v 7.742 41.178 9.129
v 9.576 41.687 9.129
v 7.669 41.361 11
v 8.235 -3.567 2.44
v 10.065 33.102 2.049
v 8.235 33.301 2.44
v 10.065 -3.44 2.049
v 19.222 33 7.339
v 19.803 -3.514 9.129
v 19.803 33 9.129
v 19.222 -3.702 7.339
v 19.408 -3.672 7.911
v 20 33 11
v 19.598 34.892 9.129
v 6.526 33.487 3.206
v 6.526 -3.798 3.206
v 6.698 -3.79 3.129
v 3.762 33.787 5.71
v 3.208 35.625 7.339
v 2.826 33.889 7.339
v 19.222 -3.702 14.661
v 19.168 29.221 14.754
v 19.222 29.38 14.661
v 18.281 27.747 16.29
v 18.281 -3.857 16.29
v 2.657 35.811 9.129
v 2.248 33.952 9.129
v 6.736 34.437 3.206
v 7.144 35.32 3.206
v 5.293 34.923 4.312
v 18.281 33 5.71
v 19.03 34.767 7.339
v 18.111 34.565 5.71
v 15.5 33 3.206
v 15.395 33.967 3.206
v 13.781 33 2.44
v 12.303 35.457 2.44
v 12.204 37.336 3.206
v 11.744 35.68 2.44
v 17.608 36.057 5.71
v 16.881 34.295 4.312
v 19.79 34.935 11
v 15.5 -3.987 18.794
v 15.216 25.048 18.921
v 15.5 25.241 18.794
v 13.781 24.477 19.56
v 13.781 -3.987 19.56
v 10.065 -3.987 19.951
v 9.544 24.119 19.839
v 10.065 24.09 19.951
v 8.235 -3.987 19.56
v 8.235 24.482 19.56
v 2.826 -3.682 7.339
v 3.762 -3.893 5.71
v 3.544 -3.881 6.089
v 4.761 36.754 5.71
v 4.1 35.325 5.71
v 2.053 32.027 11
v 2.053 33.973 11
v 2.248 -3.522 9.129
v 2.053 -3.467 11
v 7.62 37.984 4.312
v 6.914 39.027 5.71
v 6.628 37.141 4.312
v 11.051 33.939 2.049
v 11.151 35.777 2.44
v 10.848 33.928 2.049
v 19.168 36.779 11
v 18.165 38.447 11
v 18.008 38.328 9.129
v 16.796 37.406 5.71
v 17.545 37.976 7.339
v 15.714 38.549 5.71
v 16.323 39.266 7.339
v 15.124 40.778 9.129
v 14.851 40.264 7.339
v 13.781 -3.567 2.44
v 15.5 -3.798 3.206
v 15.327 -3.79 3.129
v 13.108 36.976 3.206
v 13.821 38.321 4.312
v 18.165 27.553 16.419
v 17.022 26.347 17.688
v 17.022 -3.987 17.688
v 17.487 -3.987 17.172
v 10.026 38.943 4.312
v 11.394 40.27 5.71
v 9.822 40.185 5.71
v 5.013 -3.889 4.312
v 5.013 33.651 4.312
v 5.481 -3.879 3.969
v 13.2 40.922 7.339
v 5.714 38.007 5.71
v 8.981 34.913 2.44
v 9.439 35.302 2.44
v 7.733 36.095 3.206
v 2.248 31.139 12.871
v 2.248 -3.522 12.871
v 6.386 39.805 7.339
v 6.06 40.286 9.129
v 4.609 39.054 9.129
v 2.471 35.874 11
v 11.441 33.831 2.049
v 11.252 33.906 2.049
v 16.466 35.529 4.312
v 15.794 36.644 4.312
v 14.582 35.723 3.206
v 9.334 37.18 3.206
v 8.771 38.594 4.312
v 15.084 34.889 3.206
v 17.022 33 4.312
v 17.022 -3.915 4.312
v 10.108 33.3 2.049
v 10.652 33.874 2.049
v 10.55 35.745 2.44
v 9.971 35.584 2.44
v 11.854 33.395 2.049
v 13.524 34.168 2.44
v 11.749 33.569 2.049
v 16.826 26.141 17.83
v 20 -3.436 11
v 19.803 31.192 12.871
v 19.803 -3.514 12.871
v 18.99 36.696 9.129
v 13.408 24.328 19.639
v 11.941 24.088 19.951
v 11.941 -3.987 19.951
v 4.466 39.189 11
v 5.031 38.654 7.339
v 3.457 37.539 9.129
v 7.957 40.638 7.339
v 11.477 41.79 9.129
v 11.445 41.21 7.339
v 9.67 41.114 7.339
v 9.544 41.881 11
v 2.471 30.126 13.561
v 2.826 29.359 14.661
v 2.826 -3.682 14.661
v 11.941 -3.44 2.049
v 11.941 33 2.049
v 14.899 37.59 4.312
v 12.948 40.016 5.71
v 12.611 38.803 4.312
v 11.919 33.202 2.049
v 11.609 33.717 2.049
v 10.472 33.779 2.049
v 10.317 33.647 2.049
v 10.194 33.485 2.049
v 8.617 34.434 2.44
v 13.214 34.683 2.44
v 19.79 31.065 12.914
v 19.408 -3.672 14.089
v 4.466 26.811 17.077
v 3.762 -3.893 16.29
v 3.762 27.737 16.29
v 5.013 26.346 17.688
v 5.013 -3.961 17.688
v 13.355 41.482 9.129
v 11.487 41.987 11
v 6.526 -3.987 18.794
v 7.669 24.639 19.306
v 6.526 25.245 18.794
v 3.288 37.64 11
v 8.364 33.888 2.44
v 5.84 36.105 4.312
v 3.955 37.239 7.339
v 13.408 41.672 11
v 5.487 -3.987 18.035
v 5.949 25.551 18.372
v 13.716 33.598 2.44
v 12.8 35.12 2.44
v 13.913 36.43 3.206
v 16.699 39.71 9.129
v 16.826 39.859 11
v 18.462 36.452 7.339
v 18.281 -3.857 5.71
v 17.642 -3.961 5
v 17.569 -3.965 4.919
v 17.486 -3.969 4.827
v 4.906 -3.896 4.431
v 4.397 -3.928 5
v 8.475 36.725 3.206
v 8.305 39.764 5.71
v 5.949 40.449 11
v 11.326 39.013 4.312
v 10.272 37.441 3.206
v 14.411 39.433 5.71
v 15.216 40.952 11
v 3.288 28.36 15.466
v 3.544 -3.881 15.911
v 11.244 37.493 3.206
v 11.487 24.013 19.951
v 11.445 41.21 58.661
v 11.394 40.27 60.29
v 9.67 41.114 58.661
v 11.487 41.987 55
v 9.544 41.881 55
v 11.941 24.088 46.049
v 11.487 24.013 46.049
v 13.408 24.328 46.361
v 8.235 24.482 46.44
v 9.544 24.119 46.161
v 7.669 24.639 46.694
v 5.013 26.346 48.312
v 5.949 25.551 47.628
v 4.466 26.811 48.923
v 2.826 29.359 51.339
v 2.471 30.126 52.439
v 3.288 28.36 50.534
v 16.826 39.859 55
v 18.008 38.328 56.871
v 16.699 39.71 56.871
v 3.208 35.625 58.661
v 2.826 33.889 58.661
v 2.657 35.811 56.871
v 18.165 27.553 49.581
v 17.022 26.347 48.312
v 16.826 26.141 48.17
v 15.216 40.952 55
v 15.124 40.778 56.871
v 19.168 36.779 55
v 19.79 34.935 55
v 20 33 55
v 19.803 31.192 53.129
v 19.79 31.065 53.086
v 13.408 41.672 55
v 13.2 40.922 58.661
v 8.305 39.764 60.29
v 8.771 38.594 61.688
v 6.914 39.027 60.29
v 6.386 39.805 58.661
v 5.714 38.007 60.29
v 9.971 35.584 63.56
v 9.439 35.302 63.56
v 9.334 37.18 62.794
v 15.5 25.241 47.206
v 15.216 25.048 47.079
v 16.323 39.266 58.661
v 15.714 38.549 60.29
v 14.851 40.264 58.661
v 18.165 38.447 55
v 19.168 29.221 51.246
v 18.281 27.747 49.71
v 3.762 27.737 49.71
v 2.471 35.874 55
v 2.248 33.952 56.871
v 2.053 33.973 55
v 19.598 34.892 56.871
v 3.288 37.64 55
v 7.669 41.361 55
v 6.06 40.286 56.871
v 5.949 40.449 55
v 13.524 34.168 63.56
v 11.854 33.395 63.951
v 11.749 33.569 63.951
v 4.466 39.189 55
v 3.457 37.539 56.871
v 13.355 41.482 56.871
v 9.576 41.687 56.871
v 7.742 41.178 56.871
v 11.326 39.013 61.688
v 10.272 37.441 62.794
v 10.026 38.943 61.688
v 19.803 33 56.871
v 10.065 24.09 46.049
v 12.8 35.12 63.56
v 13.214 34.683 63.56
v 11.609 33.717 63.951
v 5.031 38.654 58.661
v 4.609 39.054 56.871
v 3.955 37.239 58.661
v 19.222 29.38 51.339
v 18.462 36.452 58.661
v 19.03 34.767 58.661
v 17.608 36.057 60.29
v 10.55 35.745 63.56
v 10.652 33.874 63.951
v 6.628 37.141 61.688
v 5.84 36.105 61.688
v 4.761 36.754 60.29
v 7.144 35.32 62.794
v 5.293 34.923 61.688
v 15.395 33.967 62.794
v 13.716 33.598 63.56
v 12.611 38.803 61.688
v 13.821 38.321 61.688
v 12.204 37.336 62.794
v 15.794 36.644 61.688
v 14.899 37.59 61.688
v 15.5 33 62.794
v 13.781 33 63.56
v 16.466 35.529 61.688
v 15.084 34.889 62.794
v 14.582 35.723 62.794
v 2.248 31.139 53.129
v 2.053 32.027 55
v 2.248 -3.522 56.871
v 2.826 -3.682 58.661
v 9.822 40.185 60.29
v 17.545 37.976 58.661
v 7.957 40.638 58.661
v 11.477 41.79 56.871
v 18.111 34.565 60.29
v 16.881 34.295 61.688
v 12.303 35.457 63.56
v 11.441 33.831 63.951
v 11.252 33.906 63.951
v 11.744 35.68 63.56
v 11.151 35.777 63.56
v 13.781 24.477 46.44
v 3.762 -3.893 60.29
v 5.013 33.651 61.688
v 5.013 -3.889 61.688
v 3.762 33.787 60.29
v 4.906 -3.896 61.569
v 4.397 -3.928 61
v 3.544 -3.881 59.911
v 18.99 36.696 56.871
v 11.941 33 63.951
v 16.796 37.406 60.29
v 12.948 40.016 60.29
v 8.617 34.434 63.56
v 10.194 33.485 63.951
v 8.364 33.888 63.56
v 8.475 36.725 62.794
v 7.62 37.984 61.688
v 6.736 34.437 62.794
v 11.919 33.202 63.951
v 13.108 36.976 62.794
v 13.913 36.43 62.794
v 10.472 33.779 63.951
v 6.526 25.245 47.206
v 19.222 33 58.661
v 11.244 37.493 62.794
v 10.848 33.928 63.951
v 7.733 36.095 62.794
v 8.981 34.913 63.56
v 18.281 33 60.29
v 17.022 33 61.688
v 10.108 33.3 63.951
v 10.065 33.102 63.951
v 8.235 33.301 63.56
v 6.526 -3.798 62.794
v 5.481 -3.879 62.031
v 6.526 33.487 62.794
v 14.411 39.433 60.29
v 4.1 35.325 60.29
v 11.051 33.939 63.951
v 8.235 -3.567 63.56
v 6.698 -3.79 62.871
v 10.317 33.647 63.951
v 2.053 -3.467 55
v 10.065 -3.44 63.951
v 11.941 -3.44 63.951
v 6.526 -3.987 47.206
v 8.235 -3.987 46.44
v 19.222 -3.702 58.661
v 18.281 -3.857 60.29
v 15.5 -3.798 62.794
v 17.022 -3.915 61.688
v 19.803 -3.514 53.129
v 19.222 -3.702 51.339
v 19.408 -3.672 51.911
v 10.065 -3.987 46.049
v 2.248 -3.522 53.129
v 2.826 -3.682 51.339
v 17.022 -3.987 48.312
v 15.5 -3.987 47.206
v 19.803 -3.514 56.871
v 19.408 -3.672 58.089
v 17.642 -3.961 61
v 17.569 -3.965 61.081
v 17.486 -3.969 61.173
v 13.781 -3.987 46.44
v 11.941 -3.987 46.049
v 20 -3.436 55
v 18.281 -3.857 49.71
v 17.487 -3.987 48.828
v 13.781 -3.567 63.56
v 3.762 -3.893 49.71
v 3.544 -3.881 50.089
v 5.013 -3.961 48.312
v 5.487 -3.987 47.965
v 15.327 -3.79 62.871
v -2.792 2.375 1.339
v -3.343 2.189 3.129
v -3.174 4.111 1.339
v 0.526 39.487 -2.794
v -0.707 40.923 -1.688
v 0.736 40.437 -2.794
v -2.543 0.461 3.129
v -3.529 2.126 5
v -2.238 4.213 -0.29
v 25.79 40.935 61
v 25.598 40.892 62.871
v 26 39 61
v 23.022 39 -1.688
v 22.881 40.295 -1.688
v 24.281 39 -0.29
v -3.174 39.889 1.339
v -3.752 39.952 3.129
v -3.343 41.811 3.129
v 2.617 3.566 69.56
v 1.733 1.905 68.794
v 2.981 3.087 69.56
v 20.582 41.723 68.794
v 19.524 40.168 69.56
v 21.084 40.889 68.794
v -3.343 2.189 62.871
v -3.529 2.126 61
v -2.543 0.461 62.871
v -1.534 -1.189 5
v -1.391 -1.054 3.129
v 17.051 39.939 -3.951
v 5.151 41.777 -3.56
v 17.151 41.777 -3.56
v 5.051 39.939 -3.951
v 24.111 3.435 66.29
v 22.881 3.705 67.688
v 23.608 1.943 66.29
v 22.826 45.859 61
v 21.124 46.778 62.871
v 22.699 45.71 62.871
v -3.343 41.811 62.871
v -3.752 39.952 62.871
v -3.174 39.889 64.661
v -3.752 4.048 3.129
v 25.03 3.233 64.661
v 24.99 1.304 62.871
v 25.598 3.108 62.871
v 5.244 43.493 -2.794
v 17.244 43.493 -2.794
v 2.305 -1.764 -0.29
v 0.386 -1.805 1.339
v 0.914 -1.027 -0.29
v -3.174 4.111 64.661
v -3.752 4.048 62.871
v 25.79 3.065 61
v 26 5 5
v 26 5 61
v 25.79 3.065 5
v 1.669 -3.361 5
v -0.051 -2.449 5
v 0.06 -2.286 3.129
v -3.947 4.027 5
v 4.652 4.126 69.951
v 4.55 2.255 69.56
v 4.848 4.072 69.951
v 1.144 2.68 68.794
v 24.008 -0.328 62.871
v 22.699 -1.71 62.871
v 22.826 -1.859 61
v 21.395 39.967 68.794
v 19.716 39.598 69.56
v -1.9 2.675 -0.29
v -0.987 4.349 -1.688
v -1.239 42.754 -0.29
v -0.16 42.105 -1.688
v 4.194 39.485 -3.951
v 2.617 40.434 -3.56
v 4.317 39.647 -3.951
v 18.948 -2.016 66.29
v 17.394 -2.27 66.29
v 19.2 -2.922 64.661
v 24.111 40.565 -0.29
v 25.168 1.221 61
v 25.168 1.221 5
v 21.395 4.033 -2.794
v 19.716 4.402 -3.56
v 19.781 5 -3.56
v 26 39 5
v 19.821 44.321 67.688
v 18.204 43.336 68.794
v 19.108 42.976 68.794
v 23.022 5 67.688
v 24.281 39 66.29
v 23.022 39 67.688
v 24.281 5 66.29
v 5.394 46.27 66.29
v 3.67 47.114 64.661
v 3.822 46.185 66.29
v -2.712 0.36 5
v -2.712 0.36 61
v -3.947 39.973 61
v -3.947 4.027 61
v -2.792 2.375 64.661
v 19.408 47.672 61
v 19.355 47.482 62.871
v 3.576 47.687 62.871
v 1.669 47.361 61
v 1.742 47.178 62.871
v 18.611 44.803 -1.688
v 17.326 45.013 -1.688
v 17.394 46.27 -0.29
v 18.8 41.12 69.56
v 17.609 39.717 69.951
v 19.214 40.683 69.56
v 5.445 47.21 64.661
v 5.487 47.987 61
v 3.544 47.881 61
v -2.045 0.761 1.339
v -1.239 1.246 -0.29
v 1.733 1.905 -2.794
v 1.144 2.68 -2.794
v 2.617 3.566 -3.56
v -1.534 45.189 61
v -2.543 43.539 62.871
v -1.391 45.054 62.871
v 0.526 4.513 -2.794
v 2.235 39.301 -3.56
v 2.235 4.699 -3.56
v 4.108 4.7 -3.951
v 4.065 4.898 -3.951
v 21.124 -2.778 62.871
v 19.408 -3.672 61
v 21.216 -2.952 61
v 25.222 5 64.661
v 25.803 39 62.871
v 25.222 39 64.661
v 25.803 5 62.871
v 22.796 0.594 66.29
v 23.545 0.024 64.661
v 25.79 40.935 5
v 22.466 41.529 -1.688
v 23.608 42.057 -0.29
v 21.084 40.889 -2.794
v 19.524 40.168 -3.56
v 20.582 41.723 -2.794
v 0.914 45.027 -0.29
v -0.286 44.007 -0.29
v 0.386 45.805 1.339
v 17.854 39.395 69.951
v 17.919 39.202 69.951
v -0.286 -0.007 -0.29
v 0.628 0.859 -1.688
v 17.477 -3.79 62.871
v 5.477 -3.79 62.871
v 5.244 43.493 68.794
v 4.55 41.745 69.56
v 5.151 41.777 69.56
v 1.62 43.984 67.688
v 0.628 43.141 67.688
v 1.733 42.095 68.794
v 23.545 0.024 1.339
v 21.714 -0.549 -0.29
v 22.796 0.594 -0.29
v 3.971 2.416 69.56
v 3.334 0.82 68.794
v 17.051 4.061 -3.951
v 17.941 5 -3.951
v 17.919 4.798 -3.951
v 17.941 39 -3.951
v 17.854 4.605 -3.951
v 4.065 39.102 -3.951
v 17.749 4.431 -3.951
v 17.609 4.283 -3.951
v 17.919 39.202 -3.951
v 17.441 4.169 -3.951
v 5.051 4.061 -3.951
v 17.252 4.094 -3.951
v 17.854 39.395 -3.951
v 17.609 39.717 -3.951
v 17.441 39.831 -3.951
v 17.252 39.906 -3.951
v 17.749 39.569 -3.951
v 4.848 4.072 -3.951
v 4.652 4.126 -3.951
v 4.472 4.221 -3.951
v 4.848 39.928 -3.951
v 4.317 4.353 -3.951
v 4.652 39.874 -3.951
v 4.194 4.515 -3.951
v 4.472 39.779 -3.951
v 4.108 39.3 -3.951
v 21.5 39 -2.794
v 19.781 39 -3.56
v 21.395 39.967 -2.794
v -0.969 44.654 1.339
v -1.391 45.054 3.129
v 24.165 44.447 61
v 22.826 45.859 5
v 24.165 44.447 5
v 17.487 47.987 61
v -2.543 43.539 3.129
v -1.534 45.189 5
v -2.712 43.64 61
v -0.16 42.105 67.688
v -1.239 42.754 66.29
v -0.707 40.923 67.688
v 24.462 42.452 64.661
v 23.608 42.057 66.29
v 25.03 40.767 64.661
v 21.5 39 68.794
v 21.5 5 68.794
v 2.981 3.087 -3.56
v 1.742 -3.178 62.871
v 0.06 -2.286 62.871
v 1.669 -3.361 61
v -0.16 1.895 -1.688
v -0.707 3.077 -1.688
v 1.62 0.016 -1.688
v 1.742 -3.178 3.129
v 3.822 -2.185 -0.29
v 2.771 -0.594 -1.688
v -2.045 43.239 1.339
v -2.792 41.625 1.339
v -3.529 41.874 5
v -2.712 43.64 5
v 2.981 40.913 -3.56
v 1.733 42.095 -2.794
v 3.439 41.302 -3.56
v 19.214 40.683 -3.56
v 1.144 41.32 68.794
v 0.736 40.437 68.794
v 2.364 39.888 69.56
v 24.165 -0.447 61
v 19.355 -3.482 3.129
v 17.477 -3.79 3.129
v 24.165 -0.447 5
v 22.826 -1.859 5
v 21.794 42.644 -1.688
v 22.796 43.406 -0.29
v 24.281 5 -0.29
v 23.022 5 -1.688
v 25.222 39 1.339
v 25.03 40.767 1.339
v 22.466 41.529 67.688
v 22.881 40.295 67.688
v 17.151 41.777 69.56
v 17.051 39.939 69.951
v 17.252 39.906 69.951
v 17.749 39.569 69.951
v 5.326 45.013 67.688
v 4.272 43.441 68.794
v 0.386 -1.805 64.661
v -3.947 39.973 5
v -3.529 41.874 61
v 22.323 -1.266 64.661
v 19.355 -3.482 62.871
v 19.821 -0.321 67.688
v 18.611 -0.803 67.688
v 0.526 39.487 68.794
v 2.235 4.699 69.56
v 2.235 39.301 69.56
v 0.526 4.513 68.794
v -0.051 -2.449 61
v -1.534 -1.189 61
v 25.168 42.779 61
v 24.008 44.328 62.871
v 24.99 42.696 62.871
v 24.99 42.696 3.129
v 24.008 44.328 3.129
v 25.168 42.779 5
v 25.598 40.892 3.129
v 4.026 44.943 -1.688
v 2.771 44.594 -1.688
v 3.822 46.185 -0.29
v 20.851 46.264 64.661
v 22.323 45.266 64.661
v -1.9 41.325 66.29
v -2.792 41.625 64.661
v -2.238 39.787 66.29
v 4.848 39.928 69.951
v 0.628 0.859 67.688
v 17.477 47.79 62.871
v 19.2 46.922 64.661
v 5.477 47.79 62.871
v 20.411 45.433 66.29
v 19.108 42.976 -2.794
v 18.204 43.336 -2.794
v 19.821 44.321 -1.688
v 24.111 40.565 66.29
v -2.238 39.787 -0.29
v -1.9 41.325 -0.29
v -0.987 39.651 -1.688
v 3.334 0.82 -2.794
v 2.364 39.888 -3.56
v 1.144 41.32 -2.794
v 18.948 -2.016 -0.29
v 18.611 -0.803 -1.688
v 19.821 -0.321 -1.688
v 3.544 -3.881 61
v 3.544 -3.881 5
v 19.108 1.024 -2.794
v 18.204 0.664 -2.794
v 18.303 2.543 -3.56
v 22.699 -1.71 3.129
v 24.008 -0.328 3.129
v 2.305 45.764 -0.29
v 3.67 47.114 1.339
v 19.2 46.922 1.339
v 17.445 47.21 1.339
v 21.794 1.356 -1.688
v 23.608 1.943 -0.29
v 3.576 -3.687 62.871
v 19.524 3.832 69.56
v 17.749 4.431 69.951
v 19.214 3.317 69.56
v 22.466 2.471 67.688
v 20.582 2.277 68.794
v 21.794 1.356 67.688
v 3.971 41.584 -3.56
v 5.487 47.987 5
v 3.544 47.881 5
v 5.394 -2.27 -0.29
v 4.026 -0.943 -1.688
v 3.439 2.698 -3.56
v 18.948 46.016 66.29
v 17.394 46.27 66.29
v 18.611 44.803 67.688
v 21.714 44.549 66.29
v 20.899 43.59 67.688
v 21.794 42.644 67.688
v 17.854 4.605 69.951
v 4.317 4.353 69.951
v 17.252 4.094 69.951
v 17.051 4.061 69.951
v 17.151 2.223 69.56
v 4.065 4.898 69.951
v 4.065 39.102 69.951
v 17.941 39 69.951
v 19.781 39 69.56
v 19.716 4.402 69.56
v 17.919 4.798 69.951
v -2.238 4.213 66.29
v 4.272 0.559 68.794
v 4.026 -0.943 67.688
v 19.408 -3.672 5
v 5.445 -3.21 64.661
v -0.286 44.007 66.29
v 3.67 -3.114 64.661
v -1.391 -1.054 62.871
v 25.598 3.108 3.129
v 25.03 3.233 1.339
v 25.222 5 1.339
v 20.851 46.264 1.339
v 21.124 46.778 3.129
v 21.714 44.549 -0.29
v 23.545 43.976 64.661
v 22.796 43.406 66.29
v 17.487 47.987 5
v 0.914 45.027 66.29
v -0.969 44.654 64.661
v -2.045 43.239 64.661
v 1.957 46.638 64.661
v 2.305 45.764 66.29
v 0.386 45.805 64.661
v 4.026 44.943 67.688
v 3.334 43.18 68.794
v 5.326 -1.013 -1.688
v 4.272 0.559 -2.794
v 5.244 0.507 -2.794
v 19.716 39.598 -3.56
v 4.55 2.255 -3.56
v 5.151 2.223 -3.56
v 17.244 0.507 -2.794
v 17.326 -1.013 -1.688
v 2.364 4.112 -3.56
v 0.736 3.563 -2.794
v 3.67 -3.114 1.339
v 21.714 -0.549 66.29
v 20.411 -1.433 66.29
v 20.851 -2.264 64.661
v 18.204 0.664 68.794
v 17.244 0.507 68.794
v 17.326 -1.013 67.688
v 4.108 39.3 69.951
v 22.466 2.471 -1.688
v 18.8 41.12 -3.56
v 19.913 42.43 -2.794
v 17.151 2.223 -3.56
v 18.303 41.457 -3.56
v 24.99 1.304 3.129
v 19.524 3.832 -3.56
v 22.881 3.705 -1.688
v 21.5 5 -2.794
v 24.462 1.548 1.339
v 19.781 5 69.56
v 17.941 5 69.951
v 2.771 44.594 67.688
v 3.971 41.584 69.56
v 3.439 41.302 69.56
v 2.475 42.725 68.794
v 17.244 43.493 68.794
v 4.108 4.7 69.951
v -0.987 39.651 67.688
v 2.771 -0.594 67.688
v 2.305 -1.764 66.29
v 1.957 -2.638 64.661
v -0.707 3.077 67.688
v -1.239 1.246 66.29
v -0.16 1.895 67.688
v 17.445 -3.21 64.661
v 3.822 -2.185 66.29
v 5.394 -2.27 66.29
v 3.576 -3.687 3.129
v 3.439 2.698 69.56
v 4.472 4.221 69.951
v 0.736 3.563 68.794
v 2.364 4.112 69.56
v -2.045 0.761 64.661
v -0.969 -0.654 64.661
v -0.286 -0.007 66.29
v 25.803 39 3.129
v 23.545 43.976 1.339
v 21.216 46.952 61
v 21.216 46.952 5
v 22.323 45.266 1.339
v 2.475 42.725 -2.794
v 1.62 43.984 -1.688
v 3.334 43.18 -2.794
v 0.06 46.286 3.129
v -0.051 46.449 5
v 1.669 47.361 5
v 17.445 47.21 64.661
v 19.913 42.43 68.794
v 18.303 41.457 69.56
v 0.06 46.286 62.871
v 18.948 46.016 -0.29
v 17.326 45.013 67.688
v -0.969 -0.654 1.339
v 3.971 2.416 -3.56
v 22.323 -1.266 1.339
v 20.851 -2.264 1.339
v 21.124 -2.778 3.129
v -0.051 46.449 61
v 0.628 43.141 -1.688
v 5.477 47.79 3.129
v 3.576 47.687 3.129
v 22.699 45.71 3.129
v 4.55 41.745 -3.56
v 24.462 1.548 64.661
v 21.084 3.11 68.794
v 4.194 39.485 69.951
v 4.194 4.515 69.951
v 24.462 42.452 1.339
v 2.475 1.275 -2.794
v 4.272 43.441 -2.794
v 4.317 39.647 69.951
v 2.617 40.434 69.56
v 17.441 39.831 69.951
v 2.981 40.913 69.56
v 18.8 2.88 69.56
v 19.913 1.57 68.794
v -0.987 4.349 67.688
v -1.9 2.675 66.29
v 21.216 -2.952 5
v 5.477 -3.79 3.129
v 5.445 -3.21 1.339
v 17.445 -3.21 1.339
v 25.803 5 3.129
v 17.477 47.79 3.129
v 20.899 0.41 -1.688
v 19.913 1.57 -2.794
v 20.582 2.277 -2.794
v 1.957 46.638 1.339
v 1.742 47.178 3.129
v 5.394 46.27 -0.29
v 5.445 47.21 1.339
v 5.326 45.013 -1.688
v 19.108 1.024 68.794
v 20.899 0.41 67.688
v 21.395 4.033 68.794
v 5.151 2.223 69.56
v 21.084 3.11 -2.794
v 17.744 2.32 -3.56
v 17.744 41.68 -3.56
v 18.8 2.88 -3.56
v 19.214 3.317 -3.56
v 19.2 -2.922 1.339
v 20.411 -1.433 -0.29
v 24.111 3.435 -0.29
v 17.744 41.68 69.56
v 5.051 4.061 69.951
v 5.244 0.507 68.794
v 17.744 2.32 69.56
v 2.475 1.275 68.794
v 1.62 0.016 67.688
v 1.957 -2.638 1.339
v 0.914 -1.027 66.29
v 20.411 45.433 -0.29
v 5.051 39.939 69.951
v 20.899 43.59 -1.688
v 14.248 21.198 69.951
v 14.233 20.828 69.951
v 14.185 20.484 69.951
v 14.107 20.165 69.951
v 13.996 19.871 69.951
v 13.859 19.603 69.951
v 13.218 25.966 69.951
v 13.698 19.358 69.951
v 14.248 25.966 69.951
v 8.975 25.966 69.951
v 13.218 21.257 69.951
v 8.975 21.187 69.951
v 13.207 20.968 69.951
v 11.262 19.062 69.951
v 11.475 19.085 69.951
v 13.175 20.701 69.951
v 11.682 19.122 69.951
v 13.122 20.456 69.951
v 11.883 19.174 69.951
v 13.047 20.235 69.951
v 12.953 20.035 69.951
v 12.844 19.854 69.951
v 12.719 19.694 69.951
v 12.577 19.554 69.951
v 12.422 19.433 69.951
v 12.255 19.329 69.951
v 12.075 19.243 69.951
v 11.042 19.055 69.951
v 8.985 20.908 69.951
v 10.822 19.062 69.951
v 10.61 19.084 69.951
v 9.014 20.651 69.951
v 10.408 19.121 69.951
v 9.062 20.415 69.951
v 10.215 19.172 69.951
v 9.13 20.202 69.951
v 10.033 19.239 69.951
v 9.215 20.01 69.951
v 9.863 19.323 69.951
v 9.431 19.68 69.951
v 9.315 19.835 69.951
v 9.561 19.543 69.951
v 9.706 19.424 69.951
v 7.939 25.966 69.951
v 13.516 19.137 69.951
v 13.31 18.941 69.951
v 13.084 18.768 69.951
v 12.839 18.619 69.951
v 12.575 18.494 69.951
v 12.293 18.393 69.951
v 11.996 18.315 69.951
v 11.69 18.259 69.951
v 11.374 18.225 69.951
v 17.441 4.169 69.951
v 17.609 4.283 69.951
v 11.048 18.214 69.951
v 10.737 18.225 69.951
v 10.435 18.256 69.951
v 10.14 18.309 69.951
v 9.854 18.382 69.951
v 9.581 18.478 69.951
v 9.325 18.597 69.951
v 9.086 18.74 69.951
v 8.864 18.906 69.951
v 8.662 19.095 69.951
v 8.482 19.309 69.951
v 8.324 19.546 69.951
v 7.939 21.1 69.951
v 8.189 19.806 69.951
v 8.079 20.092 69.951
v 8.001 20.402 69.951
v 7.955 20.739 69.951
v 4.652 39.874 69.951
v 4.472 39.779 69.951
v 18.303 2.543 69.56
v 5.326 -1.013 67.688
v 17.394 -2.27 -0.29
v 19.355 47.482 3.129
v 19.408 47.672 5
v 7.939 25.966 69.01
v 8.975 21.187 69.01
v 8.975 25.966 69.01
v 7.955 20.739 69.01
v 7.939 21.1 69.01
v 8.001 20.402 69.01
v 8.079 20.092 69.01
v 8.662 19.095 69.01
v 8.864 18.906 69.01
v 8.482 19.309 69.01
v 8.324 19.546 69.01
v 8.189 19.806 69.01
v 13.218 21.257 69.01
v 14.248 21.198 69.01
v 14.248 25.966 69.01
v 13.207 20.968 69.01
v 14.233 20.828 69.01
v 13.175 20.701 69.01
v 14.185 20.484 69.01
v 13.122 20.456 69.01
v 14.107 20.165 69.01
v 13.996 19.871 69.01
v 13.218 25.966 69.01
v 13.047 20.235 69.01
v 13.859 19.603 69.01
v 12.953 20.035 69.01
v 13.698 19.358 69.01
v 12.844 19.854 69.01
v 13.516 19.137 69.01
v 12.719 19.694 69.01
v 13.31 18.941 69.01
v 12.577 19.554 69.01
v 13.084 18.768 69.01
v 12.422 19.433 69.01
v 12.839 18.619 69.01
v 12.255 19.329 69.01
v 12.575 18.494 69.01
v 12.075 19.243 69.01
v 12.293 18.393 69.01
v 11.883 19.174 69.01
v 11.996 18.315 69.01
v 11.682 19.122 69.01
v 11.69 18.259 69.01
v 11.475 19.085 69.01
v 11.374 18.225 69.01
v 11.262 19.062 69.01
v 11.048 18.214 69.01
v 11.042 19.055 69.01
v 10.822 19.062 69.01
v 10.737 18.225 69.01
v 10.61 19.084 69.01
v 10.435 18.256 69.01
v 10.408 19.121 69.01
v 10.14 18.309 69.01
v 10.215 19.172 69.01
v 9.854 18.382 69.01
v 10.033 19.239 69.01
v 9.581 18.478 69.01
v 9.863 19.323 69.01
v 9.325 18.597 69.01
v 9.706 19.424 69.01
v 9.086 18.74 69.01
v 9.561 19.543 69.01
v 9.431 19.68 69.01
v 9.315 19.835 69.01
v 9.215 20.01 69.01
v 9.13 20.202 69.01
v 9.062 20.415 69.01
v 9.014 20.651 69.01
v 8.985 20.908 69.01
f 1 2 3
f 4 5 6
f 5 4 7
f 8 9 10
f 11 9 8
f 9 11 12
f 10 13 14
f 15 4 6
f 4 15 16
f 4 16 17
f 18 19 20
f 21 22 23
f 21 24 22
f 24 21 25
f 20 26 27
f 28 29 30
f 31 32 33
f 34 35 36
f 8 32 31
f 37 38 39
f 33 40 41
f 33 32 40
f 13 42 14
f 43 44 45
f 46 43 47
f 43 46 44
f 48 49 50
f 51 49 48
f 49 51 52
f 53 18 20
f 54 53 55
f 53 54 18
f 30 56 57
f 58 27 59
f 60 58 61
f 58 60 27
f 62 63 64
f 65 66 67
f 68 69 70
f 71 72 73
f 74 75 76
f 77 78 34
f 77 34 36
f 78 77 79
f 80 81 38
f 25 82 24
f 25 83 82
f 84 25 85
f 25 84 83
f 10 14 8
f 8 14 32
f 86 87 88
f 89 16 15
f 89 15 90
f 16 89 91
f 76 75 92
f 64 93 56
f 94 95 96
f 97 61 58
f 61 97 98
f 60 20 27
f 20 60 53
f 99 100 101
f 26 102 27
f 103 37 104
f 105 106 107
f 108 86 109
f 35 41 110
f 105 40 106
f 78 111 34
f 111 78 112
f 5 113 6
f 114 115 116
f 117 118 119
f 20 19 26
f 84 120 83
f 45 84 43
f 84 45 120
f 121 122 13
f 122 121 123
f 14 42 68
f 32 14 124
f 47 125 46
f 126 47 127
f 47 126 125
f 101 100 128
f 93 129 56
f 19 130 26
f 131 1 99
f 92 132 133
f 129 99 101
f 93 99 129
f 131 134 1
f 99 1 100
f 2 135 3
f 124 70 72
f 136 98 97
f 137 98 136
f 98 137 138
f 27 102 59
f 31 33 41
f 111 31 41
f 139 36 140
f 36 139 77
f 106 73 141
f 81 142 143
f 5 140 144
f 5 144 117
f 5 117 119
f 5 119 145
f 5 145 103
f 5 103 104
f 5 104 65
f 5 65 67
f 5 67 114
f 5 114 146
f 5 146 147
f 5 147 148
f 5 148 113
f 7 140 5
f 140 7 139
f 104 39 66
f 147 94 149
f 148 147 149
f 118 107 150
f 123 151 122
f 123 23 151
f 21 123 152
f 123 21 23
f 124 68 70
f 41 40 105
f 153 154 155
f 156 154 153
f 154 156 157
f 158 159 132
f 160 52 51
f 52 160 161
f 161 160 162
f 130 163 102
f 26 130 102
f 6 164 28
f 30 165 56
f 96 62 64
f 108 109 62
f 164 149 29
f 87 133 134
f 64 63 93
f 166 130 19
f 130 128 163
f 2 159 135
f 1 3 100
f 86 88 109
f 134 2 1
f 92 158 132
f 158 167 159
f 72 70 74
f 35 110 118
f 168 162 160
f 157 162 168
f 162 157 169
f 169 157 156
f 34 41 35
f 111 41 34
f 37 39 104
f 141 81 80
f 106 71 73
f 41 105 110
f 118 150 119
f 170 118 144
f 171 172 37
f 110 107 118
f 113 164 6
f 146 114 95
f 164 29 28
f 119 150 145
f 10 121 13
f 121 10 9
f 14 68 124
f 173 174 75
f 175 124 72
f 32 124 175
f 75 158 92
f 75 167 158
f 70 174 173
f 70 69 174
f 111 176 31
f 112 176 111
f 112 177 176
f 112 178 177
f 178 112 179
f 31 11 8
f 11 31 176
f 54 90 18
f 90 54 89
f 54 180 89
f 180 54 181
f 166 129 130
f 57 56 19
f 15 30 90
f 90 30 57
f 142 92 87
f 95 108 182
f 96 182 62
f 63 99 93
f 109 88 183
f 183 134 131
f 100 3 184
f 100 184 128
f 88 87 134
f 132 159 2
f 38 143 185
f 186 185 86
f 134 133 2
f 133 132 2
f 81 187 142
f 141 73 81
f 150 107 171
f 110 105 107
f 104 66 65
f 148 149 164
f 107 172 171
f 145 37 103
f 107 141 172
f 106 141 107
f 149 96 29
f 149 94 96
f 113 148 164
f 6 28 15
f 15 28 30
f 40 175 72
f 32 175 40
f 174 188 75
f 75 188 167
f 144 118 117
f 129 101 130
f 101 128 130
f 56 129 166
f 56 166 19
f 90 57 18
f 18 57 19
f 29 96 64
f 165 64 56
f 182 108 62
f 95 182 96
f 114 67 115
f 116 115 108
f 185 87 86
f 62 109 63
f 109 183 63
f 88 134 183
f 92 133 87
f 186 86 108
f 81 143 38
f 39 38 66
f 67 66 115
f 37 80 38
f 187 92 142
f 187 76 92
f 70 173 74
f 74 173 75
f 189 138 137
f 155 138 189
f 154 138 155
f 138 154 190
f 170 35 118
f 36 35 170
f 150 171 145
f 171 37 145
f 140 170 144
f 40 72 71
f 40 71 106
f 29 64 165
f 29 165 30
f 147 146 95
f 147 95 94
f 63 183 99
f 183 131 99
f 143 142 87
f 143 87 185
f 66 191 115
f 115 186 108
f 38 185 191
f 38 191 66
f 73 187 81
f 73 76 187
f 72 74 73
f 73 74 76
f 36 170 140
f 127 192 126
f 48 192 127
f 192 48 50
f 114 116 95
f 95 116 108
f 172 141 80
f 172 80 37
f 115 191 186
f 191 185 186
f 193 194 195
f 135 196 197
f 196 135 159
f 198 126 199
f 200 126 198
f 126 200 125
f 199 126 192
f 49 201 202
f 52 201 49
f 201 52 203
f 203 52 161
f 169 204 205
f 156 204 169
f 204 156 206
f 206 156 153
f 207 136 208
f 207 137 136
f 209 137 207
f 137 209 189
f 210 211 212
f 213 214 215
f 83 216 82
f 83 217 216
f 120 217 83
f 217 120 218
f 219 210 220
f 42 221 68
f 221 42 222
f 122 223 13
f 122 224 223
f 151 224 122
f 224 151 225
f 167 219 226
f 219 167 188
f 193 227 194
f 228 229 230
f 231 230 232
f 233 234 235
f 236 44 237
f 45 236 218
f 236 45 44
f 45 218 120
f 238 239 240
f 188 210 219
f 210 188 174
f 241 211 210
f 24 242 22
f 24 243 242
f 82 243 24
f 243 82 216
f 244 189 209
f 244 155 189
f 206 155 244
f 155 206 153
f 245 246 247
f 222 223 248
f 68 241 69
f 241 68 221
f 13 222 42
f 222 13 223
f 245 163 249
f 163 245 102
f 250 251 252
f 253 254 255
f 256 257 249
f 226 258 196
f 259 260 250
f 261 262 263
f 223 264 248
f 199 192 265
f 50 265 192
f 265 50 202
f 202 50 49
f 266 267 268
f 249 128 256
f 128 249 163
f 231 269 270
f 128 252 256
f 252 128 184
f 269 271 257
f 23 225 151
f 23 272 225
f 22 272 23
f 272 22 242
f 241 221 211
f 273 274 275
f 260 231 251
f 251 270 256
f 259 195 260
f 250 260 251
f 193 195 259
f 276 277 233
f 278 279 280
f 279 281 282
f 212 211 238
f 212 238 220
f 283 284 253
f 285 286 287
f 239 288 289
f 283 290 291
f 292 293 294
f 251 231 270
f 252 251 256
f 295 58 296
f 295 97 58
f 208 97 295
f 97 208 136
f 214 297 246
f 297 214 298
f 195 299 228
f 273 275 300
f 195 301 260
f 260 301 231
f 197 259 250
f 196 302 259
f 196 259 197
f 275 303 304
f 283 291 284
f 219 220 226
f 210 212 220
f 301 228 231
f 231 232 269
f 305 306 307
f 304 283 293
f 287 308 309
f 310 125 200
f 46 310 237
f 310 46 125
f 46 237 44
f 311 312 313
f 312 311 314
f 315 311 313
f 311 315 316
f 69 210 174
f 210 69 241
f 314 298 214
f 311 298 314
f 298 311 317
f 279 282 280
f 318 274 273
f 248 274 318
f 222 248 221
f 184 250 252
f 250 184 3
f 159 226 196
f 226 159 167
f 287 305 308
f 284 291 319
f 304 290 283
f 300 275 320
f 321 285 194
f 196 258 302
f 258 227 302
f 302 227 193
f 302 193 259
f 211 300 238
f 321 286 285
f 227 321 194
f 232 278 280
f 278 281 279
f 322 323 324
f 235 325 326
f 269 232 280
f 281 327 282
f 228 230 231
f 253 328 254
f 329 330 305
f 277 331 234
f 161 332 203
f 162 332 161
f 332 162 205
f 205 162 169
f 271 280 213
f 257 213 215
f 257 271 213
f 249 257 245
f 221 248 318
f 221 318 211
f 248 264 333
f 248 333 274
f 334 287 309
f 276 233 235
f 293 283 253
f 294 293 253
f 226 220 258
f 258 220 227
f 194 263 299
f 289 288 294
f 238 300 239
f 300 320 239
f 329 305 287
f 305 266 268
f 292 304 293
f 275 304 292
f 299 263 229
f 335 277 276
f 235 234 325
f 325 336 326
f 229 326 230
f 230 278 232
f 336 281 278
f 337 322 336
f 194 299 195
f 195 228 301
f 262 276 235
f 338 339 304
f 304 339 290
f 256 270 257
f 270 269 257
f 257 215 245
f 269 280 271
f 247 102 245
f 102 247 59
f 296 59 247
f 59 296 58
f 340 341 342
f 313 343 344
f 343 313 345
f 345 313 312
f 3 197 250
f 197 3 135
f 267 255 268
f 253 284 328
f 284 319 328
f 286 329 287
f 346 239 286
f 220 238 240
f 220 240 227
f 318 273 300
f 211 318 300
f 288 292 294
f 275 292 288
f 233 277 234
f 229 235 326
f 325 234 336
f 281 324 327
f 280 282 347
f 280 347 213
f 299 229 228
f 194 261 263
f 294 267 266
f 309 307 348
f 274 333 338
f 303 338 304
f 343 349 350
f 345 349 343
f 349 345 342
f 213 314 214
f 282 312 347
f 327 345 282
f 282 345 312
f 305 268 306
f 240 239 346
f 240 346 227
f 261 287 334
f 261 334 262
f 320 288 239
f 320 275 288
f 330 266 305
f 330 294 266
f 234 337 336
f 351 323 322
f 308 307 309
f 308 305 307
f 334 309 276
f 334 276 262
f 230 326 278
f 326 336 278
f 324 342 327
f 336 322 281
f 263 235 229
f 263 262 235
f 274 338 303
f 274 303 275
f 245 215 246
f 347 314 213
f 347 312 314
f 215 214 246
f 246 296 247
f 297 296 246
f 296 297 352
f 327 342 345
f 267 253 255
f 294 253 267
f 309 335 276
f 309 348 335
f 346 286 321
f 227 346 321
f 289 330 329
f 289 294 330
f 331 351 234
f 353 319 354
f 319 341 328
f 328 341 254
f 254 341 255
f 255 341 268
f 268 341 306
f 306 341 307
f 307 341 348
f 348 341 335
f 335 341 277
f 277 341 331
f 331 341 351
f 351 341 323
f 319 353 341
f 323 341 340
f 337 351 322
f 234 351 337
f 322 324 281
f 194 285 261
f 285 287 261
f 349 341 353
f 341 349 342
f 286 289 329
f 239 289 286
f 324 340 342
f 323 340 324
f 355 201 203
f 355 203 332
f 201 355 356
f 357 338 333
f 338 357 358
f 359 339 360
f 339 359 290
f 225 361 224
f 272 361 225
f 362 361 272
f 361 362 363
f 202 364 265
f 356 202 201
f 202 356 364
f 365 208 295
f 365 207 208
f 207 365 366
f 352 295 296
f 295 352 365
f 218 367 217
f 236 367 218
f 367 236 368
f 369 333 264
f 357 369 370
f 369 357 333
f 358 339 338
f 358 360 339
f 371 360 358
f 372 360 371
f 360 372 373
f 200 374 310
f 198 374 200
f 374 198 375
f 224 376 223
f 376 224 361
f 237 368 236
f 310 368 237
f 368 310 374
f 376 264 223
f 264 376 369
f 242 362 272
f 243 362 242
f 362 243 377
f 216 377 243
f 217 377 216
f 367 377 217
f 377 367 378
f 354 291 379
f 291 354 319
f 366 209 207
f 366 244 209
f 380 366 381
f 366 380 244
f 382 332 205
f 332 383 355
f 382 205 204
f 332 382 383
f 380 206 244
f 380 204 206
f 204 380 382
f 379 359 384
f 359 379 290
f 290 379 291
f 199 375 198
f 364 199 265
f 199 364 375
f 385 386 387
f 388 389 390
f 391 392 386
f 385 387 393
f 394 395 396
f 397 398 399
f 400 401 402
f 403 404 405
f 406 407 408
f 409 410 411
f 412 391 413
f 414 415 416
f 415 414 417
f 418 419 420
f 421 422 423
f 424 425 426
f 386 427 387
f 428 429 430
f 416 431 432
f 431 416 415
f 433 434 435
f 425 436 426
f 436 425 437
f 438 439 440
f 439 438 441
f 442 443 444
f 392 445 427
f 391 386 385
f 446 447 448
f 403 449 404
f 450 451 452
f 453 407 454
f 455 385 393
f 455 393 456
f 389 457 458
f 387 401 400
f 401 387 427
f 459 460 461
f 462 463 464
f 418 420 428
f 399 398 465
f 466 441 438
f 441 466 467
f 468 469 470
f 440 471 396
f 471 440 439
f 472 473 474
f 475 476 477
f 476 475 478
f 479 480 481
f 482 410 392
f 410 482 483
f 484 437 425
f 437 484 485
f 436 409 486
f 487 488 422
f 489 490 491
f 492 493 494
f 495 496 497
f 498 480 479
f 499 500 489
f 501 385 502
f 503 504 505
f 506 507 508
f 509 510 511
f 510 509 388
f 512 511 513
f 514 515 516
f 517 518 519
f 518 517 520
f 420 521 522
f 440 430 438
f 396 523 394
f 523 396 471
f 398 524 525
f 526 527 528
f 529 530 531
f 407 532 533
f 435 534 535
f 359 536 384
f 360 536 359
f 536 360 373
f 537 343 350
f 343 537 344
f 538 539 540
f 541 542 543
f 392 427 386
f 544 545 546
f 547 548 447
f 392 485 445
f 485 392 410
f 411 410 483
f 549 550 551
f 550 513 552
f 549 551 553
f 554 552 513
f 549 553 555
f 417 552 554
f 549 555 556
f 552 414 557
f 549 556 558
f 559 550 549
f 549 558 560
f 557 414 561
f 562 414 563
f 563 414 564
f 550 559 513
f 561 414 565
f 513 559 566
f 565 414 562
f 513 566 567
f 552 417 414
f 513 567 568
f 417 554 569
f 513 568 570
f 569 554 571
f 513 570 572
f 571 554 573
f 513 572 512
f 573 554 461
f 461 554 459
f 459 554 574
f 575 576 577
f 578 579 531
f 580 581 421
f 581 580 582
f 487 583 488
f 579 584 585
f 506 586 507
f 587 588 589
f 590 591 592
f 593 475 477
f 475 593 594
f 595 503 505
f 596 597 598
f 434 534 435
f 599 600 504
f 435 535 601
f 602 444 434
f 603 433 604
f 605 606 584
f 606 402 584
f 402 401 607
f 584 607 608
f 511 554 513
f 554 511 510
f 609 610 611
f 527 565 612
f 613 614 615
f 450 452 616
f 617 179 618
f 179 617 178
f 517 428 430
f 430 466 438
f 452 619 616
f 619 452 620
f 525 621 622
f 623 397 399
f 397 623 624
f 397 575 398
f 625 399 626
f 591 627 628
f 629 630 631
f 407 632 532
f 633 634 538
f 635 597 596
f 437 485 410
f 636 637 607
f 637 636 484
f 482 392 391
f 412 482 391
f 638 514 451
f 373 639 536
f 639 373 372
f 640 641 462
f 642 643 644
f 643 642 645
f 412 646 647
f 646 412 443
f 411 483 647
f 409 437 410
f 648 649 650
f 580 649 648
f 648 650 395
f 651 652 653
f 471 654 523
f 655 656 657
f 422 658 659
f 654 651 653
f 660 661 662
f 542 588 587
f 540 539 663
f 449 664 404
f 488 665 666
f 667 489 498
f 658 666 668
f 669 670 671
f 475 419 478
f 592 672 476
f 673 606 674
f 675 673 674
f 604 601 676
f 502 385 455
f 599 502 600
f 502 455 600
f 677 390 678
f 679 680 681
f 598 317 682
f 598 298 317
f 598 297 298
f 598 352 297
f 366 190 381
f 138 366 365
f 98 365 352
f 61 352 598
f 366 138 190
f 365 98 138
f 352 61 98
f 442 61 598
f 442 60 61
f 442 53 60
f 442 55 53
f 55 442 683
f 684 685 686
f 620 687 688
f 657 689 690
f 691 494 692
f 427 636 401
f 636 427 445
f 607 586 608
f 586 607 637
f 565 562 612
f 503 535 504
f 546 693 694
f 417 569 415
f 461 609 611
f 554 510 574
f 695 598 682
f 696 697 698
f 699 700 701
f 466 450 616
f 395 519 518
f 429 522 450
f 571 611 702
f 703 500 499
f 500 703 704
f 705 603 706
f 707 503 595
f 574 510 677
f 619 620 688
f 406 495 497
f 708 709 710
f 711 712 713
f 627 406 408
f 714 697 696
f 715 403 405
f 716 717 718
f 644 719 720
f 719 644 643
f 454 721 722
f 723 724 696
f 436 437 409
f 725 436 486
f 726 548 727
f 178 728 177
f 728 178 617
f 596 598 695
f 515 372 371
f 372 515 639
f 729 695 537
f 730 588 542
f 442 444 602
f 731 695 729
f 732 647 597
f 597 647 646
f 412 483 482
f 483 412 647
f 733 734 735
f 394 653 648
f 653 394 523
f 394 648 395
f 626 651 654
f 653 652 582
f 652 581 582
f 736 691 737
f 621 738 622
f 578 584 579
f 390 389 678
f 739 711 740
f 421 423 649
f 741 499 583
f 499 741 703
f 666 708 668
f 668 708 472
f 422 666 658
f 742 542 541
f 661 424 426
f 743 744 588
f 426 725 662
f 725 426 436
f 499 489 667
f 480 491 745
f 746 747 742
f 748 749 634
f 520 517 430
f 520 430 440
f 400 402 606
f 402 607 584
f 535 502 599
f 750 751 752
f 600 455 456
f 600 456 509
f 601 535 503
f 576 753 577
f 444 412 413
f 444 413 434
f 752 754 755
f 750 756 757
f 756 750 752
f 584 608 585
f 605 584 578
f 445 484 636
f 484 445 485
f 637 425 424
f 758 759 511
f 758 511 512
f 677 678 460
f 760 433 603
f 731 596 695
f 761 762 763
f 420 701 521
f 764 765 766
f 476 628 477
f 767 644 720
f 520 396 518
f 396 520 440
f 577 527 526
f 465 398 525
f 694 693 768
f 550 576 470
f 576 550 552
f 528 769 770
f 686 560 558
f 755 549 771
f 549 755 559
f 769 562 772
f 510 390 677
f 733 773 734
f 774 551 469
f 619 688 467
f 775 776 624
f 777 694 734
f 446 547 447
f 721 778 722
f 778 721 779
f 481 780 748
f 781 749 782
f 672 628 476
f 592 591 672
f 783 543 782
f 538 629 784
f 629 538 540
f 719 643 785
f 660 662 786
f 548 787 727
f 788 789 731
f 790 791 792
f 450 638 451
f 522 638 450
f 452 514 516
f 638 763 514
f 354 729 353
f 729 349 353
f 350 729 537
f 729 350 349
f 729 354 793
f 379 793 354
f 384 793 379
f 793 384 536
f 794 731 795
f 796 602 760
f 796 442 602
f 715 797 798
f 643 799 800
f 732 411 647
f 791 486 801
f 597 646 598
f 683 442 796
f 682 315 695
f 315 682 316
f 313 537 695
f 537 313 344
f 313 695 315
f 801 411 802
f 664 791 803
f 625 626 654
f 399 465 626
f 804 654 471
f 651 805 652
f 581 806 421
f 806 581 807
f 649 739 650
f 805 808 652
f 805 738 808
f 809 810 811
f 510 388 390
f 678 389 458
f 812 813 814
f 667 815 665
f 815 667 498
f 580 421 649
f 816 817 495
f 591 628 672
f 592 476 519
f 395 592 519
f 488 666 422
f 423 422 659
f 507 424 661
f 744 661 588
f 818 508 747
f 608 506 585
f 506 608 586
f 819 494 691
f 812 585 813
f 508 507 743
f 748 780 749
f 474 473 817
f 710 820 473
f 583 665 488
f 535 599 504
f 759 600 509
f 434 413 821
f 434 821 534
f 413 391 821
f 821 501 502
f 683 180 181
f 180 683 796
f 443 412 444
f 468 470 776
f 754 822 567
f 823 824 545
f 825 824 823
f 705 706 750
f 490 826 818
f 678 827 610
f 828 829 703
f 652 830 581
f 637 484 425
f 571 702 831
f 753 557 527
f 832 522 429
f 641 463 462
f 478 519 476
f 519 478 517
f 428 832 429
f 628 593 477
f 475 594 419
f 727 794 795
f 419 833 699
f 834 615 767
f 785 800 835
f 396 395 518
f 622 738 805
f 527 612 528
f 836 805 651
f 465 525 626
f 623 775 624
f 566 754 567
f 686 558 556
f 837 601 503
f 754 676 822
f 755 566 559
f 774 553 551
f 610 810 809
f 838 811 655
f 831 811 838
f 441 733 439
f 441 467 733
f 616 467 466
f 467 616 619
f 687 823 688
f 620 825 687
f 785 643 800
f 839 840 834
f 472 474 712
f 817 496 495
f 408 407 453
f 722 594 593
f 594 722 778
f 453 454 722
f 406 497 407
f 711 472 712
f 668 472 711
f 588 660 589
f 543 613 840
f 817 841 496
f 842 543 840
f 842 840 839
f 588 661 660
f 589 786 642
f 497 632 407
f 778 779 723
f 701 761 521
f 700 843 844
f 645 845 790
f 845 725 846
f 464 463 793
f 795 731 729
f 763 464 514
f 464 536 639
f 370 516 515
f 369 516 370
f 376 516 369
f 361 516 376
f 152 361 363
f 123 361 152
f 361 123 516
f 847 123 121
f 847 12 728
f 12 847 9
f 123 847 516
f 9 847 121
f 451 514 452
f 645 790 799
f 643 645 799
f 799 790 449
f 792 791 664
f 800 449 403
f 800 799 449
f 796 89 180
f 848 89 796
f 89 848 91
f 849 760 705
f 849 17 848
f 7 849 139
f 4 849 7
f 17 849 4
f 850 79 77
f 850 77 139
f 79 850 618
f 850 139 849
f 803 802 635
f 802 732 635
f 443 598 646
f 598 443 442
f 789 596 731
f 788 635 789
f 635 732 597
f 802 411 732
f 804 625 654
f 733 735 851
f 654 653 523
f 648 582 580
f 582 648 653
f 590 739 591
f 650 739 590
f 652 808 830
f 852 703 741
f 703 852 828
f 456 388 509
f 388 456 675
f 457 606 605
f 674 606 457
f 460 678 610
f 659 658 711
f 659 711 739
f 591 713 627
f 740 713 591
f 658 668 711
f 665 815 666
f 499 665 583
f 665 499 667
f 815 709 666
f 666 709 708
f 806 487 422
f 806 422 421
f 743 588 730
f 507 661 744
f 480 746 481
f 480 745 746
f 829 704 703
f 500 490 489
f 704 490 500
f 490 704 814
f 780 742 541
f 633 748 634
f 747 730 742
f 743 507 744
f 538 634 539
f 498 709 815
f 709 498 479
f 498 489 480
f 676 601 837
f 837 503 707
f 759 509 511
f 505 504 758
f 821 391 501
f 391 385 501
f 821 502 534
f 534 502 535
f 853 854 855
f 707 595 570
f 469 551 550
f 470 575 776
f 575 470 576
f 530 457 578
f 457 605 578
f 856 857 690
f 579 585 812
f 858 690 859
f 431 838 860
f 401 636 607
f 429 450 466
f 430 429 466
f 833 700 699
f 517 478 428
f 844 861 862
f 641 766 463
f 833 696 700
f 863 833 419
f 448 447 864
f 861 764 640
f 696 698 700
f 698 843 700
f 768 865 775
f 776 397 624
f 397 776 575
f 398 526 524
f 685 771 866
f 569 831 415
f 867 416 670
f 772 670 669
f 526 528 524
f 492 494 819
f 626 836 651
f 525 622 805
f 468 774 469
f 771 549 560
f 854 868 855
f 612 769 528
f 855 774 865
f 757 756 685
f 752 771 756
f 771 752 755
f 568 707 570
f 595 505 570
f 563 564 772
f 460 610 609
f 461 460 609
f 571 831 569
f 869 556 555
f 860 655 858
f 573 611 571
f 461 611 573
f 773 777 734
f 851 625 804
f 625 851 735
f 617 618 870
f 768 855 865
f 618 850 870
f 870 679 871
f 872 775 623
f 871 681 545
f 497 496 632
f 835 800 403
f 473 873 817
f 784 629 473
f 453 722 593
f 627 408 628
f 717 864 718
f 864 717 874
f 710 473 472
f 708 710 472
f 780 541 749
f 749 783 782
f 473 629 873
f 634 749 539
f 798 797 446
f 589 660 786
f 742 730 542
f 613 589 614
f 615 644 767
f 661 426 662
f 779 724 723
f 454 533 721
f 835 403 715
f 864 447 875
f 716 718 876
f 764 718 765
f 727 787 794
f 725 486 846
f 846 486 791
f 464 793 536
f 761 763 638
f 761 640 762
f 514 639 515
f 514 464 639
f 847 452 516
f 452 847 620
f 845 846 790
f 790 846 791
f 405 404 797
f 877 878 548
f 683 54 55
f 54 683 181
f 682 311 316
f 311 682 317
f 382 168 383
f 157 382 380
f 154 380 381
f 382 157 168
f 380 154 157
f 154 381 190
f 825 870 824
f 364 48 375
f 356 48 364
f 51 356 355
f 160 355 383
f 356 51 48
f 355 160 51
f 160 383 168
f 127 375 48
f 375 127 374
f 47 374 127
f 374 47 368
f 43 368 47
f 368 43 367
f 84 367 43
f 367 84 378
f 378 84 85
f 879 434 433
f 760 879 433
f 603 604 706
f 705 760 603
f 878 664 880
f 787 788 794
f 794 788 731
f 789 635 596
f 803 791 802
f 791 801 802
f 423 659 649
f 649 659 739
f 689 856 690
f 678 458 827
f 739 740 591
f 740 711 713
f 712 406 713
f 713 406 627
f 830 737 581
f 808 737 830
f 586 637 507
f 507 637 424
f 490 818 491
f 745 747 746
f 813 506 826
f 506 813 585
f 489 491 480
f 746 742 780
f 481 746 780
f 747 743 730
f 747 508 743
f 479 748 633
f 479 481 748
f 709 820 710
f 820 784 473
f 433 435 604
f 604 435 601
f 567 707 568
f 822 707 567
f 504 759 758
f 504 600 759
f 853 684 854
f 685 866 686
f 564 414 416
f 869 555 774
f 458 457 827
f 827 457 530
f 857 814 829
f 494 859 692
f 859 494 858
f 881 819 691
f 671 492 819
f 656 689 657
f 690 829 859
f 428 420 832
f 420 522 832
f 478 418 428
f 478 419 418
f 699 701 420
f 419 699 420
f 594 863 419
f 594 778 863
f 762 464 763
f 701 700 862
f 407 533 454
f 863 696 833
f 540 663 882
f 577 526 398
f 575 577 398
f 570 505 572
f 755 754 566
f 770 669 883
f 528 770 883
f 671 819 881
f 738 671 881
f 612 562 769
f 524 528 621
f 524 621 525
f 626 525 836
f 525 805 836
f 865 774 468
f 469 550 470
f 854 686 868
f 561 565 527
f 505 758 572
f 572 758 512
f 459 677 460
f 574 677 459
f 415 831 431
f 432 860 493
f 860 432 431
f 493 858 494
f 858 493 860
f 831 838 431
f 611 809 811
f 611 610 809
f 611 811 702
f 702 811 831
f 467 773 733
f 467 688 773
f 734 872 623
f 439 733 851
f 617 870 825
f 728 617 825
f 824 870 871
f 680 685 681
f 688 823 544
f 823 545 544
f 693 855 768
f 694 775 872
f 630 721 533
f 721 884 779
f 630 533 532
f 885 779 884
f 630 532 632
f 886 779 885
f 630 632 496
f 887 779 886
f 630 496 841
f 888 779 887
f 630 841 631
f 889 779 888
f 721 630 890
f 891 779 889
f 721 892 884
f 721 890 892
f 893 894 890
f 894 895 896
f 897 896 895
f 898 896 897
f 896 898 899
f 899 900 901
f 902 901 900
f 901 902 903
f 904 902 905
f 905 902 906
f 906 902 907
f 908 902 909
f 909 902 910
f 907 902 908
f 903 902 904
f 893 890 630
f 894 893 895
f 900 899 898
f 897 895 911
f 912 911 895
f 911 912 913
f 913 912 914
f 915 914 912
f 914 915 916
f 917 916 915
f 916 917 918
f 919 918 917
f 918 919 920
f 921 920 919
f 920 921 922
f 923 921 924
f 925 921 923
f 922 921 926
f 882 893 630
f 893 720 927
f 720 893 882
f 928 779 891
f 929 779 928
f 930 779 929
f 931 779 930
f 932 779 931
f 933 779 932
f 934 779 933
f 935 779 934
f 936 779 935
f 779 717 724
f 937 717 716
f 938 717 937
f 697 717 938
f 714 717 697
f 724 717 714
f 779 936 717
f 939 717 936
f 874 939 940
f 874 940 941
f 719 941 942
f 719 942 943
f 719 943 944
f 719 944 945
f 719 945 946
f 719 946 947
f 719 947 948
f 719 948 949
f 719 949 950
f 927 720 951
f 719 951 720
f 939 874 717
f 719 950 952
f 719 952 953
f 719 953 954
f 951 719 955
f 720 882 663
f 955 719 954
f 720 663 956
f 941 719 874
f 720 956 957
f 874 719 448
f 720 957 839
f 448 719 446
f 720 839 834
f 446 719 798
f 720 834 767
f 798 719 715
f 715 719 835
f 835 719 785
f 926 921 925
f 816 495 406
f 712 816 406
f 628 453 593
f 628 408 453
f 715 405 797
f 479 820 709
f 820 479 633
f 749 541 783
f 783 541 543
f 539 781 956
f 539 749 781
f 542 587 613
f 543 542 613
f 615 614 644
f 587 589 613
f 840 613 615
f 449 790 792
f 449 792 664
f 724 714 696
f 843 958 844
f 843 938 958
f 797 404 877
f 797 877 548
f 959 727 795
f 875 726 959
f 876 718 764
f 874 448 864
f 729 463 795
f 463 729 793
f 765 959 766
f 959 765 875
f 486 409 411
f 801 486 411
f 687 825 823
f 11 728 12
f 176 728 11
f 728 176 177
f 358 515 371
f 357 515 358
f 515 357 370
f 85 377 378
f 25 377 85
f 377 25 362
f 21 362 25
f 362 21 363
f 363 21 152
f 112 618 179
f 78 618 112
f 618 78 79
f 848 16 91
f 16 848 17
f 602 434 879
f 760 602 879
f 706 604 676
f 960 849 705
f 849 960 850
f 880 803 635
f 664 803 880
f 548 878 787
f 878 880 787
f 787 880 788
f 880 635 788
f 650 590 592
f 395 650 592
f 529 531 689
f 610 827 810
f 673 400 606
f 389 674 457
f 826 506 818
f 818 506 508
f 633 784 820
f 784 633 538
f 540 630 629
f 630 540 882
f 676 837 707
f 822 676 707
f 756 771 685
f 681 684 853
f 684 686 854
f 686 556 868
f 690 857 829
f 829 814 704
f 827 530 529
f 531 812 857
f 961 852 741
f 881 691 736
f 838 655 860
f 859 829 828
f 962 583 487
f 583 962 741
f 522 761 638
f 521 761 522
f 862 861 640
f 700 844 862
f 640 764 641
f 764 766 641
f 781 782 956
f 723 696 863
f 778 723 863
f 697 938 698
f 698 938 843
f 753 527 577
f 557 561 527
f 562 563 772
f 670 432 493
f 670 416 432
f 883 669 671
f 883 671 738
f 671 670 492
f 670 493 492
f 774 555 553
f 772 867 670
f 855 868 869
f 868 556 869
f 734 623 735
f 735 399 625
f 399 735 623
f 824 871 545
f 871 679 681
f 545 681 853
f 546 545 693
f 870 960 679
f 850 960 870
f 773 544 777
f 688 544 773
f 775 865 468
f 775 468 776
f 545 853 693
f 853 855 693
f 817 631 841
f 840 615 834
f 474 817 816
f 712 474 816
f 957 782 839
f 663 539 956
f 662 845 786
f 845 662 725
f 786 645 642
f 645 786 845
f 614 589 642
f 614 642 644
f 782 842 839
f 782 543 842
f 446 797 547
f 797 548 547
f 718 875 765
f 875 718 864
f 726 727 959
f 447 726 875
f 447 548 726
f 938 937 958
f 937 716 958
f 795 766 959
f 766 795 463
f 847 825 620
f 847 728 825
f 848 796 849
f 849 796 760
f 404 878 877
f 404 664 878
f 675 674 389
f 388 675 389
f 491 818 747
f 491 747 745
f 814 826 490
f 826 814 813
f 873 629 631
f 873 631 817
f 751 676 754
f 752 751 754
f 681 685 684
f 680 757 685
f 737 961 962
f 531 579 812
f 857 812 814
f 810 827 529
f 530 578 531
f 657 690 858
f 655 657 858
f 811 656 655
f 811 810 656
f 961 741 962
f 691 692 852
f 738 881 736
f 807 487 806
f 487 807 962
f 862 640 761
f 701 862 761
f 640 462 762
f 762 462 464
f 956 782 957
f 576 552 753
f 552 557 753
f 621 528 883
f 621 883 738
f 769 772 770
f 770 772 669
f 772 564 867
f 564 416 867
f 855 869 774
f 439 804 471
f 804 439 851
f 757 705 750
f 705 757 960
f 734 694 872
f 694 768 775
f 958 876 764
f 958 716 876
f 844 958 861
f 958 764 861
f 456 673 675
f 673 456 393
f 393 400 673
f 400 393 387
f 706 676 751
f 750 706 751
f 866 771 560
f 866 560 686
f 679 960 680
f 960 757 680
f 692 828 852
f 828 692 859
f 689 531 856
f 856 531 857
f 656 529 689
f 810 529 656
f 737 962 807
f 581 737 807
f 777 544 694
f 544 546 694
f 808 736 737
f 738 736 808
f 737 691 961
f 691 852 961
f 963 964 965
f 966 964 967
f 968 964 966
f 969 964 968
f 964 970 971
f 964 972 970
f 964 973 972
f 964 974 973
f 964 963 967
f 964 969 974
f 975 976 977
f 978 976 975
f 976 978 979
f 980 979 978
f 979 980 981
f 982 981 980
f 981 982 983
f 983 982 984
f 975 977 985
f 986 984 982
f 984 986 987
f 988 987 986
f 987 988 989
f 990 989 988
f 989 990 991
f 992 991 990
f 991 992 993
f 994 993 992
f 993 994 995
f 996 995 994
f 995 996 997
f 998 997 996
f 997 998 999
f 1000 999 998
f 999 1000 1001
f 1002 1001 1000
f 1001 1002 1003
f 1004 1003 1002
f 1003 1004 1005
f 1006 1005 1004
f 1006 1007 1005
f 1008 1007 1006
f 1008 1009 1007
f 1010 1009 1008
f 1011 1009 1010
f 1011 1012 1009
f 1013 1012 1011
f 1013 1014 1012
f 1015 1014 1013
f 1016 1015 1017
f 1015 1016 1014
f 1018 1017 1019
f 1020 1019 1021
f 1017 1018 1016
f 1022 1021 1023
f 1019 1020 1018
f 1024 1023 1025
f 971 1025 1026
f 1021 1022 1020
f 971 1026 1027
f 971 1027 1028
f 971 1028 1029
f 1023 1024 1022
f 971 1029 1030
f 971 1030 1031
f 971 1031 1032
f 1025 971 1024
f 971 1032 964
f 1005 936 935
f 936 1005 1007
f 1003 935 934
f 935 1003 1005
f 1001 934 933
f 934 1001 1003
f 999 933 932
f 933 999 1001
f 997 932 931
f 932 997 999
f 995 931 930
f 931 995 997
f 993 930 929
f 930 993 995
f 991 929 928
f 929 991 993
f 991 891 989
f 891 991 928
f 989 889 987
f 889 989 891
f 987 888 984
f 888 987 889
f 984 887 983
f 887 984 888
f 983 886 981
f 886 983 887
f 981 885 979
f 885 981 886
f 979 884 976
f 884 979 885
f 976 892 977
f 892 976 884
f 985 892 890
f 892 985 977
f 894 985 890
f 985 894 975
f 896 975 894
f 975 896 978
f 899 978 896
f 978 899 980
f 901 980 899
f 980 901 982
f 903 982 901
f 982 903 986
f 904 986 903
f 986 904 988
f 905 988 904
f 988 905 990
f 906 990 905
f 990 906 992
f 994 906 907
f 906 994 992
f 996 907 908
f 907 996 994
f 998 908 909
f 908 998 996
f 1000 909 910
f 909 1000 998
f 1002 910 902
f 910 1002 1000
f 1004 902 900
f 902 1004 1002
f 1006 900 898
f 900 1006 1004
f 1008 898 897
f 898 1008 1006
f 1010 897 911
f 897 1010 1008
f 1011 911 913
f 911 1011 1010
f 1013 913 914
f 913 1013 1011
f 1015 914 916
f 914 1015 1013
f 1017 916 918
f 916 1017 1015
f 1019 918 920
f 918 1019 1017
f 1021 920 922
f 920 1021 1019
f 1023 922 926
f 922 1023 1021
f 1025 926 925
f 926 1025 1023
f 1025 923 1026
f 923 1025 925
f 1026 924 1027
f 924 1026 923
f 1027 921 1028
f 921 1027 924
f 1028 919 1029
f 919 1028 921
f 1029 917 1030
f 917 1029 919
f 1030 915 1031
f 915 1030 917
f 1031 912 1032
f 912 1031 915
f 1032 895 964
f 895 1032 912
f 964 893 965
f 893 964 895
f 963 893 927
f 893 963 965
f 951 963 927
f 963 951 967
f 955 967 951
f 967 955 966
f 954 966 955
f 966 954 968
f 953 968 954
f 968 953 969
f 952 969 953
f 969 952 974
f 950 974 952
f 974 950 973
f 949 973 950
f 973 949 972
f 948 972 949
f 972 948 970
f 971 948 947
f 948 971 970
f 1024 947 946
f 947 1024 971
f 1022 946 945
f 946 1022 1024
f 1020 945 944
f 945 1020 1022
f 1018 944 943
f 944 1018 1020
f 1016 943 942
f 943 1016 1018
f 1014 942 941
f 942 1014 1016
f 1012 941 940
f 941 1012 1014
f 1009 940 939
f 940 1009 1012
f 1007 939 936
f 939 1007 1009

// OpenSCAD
// file: marble_maze.scad
//$fn=100;
tunnel_diameter=16+2; // mm, based on http://glassmarbles.com/size.htm
tunnel_offset=tunnel_diameter+4;

maze_boundary_padding=[8, 8, 8];

title_size = 8;
title_depth = 1;

module generate_maze_path(segments){
   for(segment = segments){  
      hull() for(terminal = segment){
         scaled_offset = terminal * tunnel_offset;
         
         translate([
            scaled_offset[0] + tunnel_offset/2,
            scaled_offset[1] + tunnel_offset/2,
            scaled_offset[2] + tunnel_offset/2]) sphere(d=tunnel_diameter);    
      }
   }
}

module generate_maze(title, size, segments){
   t = [tunnel_diameter, tunnel_diameter, tunnel_diameter];
   cube_size_scaled = size*tunnel_offset;

   difference(){
      translate(t/2-maze_boundary_padding/2) minkowski(){
         cube(cube_size_scaled - t + maze_boundary_padding);
         sphere(d=tunnel_diameter);
      }

      translate([
         cube_size_scaled[0]/2, 
         cube_size_scaled[1]/2, 
         cube_size_scaled[2] - title_depth + 0.01 + maze_boundary_padding[2]/2
      ]) 
      linear_extrude(title_depth + 0.01) 
      text(title, size=title_size, halign="center", valign="center");

      generate_maze_path(segments, tunnel_diameter, tunnel_offset);
   }
}


// A simple U shaped "maze"

//$fn=100;

/*segments = [
   [[0, -1, 0], [0, 1, 0]],
   [[0, 1, 0], [0, 1, 2]],
   [[0, 1, 2], [0, -1, 2]]
];

size=[1,2,3];

title = "U Maze";*/


//generate_maze(title, size, segments);
//generate_maze_path(segments);
// main file
// A simple U shaped "maze"

segments = [
   [[0, -1, 0], [0, 1, 0]],
   [[0, 1, 0], [0, 1, 2]],
   [[0, 1, 2], [0, -1, 2]]
];

size=[1,2,3];

title = "U";

include <marble_maze.scad>;

generate_maze(title, size, segments);
//generate_maze_path(segments);
